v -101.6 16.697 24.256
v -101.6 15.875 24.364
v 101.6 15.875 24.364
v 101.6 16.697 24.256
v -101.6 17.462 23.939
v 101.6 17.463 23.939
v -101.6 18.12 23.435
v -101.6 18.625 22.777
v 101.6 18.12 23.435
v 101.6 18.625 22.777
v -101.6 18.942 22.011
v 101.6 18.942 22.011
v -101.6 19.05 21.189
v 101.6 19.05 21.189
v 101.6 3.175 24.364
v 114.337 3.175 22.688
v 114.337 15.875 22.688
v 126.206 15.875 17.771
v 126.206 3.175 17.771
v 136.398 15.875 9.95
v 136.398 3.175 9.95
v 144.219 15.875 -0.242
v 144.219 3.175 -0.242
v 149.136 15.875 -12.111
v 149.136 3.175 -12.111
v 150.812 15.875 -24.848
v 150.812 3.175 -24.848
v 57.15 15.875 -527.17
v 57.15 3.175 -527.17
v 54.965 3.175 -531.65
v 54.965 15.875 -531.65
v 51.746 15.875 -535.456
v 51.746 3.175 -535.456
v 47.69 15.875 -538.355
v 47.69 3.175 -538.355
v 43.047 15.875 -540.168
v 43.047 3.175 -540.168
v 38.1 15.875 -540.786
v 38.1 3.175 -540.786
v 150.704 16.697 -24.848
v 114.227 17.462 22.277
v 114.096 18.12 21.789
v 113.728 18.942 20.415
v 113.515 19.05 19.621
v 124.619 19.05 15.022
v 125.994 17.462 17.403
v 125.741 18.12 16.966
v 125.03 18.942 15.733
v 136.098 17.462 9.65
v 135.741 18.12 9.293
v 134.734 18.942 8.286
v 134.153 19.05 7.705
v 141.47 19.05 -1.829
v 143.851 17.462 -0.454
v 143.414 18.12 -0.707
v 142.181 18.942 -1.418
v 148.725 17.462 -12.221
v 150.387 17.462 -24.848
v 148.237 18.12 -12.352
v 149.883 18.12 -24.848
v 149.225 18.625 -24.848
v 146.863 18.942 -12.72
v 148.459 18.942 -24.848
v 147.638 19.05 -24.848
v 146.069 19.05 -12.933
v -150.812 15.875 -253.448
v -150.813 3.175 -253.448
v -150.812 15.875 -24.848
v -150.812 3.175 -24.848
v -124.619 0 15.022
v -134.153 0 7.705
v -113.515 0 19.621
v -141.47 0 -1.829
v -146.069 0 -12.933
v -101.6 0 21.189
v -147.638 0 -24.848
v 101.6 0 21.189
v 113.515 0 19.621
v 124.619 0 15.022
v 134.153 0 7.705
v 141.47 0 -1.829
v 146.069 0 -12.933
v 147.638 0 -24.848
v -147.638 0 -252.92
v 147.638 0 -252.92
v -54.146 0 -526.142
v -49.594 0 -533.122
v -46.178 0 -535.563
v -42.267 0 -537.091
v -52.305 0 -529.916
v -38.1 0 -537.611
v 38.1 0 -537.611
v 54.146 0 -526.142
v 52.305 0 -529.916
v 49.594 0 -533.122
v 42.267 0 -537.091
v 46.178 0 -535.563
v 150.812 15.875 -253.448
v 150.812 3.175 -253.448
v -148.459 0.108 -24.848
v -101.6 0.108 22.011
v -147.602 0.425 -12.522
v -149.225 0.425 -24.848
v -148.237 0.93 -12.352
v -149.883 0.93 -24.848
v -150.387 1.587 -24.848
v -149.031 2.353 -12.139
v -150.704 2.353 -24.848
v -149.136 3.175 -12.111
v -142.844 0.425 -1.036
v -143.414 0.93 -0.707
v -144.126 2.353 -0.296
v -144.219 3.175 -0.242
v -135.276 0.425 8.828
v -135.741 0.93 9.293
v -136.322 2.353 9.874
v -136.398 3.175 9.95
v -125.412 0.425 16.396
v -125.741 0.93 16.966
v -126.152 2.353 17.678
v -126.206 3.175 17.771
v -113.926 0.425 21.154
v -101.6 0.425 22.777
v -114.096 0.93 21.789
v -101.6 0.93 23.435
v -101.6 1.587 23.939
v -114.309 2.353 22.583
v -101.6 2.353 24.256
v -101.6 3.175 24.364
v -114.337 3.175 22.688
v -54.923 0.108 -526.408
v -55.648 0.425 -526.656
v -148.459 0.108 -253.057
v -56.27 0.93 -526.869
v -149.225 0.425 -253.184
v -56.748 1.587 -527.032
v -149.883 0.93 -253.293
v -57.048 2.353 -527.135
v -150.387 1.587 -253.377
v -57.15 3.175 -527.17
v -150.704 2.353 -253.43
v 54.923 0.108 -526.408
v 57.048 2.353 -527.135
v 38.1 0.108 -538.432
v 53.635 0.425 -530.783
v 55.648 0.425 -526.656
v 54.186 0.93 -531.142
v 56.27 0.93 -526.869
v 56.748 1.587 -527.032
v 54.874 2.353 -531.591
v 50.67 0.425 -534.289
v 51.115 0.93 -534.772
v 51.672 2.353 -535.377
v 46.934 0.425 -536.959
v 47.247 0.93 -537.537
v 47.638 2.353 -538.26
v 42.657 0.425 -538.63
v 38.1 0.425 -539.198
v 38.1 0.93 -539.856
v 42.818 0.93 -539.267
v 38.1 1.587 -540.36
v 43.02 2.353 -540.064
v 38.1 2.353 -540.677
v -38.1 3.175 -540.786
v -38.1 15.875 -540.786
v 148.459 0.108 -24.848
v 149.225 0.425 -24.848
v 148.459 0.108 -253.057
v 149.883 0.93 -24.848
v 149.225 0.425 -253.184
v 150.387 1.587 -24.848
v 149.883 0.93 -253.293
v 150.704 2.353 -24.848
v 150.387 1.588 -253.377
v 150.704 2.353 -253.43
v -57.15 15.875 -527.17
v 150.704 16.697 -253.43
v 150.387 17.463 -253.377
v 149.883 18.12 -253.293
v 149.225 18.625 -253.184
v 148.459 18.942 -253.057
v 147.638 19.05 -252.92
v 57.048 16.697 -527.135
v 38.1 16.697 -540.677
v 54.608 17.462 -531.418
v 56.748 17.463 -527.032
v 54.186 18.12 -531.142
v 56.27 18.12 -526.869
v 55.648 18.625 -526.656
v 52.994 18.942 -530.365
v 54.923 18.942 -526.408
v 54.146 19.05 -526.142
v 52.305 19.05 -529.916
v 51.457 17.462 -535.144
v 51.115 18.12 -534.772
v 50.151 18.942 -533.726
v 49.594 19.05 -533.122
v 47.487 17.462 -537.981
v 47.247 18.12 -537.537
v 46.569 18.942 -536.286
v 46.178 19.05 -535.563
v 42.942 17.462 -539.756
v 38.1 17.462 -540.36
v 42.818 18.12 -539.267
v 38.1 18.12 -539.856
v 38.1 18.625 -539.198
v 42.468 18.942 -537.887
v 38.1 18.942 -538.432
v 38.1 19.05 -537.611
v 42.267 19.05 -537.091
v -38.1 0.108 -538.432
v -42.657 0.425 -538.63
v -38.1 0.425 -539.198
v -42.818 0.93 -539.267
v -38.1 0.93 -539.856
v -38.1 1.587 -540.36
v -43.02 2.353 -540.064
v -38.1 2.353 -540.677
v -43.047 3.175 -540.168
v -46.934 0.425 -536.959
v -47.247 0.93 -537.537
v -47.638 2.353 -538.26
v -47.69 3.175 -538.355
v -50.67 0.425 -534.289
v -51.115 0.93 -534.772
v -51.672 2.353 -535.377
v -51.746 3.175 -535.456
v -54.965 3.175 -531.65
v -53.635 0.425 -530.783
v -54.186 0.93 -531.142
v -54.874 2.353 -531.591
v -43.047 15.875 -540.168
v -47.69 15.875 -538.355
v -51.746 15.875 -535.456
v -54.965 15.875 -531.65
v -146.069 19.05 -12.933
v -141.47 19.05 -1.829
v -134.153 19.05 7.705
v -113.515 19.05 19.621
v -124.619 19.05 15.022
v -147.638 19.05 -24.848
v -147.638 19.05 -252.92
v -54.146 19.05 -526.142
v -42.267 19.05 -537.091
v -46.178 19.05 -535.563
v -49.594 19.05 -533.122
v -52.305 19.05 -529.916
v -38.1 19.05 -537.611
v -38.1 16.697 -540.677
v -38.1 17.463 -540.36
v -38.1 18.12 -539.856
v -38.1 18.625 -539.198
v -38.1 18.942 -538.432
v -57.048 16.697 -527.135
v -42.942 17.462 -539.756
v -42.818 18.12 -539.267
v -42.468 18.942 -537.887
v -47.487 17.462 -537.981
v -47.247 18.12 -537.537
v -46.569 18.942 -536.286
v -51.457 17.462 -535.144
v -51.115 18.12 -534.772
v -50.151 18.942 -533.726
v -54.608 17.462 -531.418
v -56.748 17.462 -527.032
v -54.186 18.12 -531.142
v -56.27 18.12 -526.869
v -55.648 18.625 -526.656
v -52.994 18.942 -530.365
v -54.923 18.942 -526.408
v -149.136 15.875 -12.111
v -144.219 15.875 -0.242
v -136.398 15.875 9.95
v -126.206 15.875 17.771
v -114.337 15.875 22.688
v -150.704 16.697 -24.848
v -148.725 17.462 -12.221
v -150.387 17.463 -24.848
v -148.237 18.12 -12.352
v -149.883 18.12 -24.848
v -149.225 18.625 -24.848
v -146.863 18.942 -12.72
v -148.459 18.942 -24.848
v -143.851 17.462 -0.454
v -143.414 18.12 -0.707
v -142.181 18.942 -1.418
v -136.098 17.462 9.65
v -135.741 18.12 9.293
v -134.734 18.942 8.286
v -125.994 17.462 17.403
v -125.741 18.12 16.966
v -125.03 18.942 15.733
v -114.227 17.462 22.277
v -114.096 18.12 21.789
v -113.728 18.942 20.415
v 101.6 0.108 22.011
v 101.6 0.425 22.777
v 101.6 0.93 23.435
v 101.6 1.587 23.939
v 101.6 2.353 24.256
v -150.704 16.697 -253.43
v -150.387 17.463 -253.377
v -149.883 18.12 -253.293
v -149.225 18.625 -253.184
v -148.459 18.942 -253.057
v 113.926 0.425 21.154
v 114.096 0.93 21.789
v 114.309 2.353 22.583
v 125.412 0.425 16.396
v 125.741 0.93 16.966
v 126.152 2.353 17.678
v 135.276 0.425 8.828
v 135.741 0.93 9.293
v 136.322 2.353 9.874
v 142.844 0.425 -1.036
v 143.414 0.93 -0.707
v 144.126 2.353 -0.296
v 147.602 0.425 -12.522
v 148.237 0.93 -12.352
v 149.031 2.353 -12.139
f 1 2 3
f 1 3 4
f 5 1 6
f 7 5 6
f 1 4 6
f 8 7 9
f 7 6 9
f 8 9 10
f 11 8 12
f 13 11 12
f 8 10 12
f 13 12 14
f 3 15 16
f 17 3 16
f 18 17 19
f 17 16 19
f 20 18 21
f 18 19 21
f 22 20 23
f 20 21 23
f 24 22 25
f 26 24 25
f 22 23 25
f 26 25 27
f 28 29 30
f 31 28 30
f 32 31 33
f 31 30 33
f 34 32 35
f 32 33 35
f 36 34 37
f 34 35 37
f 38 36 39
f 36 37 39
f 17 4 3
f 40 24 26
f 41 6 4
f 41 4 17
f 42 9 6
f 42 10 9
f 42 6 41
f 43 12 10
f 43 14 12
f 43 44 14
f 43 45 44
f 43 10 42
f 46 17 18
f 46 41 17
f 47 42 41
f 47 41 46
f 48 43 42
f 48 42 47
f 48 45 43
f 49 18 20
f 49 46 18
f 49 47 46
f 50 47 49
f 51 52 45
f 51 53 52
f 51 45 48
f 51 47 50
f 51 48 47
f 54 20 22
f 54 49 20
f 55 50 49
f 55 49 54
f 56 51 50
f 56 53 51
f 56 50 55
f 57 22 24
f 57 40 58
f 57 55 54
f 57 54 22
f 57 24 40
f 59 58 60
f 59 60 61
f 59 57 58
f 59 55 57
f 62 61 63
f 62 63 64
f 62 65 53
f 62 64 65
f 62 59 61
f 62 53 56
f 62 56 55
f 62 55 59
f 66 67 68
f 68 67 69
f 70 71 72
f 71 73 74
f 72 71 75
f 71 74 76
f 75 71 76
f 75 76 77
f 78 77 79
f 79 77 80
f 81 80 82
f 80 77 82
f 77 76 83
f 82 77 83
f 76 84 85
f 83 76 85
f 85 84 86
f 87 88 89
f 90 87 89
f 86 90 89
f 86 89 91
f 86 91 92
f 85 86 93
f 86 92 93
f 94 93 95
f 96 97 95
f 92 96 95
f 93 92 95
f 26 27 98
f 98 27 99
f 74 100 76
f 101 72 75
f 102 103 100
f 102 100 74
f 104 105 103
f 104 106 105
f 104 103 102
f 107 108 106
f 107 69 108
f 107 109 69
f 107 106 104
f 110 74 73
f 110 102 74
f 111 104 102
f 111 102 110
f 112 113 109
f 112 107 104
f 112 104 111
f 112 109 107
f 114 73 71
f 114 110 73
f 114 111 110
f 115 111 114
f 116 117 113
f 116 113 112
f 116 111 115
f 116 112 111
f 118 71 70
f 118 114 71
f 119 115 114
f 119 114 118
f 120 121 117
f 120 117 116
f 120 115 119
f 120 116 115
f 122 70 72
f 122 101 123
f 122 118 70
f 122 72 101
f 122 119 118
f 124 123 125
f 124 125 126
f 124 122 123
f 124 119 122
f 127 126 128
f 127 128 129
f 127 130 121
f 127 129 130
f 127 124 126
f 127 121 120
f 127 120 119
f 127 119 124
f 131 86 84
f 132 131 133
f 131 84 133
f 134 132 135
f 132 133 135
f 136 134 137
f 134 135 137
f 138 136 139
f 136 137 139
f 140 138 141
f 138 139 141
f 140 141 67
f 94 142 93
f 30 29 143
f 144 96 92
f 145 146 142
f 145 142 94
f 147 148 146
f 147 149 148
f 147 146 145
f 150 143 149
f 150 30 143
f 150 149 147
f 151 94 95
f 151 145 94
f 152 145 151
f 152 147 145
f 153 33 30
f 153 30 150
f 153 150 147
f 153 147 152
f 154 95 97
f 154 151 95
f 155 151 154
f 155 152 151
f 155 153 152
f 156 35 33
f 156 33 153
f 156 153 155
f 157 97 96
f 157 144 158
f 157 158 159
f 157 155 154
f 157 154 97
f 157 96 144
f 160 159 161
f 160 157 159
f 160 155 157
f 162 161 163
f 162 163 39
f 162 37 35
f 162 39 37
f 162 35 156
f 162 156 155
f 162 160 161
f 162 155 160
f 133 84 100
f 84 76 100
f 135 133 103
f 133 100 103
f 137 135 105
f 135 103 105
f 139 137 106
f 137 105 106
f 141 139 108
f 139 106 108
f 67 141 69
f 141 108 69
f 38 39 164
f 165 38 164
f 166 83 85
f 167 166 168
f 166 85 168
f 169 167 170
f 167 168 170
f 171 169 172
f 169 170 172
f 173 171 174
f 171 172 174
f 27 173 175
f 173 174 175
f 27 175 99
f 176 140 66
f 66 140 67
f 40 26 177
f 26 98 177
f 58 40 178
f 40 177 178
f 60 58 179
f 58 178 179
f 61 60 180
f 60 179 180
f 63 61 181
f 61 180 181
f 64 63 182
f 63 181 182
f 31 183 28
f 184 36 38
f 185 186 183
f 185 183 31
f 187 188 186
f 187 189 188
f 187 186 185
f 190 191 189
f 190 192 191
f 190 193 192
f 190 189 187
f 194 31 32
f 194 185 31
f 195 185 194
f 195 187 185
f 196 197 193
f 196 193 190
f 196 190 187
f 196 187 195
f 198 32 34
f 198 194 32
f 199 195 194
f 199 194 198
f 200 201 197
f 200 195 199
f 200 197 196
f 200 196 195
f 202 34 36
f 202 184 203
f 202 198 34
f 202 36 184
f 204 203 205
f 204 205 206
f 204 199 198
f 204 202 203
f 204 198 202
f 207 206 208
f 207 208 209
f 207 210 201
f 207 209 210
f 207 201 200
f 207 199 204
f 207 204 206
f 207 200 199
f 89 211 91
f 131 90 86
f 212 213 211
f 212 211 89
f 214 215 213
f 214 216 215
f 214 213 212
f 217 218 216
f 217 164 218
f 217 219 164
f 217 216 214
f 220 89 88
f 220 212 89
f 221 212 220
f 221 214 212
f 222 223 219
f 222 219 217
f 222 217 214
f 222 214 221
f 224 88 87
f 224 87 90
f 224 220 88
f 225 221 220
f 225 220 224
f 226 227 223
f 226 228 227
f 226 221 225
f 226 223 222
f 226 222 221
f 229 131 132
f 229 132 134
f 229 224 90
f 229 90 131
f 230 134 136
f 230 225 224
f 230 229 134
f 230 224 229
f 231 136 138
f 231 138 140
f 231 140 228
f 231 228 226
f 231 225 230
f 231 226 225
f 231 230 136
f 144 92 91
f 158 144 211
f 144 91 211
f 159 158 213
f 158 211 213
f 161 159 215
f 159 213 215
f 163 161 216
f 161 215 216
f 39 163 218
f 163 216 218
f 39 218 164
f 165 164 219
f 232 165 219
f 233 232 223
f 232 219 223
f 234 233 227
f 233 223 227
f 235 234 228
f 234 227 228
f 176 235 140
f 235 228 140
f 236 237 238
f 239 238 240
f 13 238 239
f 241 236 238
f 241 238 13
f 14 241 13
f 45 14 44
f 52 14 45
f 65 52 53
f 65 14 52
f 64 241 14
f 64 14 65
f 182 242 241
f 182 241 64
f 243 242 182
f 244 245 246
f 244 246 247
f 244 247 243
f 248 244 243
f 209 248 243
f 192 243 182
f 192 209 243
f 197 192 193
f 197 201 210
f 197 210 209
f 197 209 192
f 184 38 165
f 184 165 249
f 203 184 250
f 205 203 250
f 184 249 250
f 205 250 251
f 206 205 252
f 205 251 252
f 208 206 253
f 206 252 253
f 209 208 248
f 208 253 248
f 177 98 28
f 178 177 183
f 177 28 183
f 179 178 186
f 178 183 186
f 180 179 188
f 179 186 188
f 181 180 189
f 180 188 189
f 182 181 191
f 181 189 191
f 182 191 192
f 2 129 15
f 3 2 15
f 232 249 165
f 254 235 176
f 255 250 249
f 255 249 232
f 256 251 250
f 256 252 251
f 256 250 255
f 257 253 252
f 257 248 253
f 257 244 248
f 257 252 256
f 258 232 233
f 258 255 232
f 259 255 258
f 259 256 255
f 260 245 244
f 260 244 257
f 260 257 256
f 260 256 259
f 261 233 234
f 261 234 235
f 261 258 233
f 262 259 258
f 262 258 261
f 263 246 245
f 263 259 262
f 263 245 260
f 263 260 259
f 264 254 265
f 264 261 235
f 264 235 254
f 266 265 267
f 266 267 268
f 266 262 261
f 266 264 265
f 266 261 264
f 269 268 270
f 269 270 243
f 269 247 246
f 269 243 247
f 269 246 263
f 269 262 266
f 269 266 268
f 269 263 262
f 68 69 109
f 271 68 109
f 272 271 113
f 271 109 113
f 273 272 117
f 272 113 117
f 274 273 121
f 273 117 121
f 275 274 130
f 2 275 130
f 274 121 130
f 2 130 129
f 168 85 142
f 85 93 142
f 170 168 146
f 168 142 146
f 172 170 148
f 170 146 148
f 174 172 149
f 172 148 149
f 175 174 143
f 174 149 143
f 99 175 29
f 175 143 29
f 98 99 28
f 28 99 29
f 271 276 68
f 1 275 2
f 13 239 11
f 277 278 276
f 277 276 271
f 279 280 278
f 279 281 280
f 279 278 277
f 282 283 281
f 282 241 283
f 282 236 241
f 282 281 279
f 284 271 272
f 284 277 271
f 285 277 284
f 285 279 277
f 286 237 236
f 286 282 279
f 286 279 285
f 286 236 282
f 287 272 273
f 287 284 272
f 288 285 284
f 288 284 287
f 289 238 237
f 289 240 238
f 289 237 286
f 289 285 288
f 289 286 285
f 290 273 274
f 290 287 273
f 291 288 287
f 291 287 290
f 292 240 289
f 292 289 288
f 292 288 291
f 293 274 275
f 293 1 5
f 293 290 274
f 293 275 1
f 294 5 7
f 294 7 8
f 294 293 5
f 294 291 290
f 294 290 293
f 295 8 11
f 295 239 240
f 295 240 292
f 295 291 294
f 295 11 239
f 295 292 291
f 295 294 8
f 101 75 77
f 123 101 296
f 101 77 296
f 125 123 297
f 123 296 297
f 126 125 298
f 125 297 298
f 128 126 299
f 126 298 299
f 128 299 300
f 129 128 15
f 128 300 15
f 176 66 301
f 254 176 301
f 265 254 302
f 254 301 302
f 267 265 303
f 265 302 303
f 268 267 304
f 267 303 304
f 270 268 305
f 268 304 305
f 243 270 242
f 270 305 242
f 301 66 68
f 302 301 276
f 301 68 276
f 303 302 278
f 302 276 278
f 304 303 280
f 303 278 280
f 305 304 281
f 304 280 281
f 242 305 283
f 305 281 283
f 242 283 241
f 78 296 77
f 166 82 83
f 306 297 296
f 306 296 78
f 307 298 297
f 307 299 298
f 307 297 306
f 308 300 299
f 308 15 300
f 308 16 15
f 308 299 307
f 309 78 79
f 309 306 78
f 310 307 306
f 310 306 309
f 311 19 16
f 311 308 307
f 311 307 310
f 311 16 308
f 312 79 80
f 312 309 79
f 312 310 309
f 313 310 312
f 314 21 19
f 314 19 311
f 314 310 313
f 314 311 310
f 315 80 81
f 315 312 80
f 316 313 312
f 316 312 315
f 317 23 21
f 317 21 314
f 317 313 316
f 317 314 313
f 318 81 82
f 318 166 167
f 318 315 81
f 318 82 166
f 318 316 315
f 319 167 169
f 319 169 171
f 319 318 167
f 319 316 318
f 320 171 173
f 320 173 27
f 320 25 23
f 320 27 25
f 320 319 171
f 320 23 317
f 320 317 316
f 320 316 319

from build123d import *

# Parameters (mm, degrees)
BOSS_EXTRUDE1_DEPTH = 19.05
FILLET1_R           = 3.175
FILLET2_R           = 3.175


with BuildPart() as part:
    # Sketch1 → Boss-Extrude1 (new body)
    with BuildSketch(Plane(origin=(0, 0, 0), x_dir=(1, 0, 0), z_dir=(0, 1, 0))):
        with BuildLine():
            Line((-101.6, -24.364478091), (101.6, -24.364478091))
            ThreePointArc((101.6, -24.364478091), (136.398492469, -9.95047056), (150.8125, 24.848021909))
            Line((150.8125, 24.848021909), (150.8125, 253.448021909))
            Line((150.8125, 253.448021909), (57.15, 527.169679348))
            ThreePointArc((57.15, 527.169679348), (49.807835716, 537.031618051), (38.1, 540.785521909))
            Line((38.1, 540.785521909), (-38.1, 540.785521909))
            ThreePointArc((-38.1, 540.785521909), (-49.807835716, 537.031618051), (-57.15, 527.169679348))
            Line((-57.15, 527.169679348), (-150.8125, 253.448021909))
            Line((-150.8125, 253.448021909), (-150.8125, 24.848021909))
            ThreePointArc((-150.8125, 24.848021909), (-136.398492469, -9.95047056), (-101.6, -24.364478091))
        make_face()
    extrude(amount=BOSS_EXTRUDE1_DEPTH)

    # Fillet1
    fillet1_edges = [part.edges().sort_by_distance(p)[0] for p in [
        (136.398492469, 19.05, 9.95047056),
        (150.8125, 19.05, -139.148021909),
        (103.98125, 19.05, -390.308850629),
        (49.807835716, 19.05, -537.031618051),
        (0, 19.05, -540.785521909),
        (-49.807835716, 19.05, -537.031618051),
        (-103.98125, 19.05, -390.308850629),
        (-150.8125, 19.05, -139.148021909),
        (-136.398492469, 19.05, 9.95047056),
        (0, 19.05, 24.364478091),
    ]]
    fillet(fillet1_edges, radius=FILLET1_R)

    # Fillet2
    fillet2_edges = [part.edges().sort_by_distance(p)[0] for p in [
        (-49.807835716, 0, -537.031618051),
        (0, 0, -540.785521909),
        (49.807835716, 0, -537.031618051),
        (103.98125, 0, -390.308850629),
        (150.8125, 0, -139.148021909),
        (136.398492469, 0, 9.95047056),
        (0, 0, 24.364478091),
        (-136.398492469, 0, 9.95047056),
        (-150.8125, 0, -139.148021909),
        (-103.98125, 0, -390.308850629),
    ]]
    fillet(fillet2_edges, radius=FILLET2_R)


solid = part.part
